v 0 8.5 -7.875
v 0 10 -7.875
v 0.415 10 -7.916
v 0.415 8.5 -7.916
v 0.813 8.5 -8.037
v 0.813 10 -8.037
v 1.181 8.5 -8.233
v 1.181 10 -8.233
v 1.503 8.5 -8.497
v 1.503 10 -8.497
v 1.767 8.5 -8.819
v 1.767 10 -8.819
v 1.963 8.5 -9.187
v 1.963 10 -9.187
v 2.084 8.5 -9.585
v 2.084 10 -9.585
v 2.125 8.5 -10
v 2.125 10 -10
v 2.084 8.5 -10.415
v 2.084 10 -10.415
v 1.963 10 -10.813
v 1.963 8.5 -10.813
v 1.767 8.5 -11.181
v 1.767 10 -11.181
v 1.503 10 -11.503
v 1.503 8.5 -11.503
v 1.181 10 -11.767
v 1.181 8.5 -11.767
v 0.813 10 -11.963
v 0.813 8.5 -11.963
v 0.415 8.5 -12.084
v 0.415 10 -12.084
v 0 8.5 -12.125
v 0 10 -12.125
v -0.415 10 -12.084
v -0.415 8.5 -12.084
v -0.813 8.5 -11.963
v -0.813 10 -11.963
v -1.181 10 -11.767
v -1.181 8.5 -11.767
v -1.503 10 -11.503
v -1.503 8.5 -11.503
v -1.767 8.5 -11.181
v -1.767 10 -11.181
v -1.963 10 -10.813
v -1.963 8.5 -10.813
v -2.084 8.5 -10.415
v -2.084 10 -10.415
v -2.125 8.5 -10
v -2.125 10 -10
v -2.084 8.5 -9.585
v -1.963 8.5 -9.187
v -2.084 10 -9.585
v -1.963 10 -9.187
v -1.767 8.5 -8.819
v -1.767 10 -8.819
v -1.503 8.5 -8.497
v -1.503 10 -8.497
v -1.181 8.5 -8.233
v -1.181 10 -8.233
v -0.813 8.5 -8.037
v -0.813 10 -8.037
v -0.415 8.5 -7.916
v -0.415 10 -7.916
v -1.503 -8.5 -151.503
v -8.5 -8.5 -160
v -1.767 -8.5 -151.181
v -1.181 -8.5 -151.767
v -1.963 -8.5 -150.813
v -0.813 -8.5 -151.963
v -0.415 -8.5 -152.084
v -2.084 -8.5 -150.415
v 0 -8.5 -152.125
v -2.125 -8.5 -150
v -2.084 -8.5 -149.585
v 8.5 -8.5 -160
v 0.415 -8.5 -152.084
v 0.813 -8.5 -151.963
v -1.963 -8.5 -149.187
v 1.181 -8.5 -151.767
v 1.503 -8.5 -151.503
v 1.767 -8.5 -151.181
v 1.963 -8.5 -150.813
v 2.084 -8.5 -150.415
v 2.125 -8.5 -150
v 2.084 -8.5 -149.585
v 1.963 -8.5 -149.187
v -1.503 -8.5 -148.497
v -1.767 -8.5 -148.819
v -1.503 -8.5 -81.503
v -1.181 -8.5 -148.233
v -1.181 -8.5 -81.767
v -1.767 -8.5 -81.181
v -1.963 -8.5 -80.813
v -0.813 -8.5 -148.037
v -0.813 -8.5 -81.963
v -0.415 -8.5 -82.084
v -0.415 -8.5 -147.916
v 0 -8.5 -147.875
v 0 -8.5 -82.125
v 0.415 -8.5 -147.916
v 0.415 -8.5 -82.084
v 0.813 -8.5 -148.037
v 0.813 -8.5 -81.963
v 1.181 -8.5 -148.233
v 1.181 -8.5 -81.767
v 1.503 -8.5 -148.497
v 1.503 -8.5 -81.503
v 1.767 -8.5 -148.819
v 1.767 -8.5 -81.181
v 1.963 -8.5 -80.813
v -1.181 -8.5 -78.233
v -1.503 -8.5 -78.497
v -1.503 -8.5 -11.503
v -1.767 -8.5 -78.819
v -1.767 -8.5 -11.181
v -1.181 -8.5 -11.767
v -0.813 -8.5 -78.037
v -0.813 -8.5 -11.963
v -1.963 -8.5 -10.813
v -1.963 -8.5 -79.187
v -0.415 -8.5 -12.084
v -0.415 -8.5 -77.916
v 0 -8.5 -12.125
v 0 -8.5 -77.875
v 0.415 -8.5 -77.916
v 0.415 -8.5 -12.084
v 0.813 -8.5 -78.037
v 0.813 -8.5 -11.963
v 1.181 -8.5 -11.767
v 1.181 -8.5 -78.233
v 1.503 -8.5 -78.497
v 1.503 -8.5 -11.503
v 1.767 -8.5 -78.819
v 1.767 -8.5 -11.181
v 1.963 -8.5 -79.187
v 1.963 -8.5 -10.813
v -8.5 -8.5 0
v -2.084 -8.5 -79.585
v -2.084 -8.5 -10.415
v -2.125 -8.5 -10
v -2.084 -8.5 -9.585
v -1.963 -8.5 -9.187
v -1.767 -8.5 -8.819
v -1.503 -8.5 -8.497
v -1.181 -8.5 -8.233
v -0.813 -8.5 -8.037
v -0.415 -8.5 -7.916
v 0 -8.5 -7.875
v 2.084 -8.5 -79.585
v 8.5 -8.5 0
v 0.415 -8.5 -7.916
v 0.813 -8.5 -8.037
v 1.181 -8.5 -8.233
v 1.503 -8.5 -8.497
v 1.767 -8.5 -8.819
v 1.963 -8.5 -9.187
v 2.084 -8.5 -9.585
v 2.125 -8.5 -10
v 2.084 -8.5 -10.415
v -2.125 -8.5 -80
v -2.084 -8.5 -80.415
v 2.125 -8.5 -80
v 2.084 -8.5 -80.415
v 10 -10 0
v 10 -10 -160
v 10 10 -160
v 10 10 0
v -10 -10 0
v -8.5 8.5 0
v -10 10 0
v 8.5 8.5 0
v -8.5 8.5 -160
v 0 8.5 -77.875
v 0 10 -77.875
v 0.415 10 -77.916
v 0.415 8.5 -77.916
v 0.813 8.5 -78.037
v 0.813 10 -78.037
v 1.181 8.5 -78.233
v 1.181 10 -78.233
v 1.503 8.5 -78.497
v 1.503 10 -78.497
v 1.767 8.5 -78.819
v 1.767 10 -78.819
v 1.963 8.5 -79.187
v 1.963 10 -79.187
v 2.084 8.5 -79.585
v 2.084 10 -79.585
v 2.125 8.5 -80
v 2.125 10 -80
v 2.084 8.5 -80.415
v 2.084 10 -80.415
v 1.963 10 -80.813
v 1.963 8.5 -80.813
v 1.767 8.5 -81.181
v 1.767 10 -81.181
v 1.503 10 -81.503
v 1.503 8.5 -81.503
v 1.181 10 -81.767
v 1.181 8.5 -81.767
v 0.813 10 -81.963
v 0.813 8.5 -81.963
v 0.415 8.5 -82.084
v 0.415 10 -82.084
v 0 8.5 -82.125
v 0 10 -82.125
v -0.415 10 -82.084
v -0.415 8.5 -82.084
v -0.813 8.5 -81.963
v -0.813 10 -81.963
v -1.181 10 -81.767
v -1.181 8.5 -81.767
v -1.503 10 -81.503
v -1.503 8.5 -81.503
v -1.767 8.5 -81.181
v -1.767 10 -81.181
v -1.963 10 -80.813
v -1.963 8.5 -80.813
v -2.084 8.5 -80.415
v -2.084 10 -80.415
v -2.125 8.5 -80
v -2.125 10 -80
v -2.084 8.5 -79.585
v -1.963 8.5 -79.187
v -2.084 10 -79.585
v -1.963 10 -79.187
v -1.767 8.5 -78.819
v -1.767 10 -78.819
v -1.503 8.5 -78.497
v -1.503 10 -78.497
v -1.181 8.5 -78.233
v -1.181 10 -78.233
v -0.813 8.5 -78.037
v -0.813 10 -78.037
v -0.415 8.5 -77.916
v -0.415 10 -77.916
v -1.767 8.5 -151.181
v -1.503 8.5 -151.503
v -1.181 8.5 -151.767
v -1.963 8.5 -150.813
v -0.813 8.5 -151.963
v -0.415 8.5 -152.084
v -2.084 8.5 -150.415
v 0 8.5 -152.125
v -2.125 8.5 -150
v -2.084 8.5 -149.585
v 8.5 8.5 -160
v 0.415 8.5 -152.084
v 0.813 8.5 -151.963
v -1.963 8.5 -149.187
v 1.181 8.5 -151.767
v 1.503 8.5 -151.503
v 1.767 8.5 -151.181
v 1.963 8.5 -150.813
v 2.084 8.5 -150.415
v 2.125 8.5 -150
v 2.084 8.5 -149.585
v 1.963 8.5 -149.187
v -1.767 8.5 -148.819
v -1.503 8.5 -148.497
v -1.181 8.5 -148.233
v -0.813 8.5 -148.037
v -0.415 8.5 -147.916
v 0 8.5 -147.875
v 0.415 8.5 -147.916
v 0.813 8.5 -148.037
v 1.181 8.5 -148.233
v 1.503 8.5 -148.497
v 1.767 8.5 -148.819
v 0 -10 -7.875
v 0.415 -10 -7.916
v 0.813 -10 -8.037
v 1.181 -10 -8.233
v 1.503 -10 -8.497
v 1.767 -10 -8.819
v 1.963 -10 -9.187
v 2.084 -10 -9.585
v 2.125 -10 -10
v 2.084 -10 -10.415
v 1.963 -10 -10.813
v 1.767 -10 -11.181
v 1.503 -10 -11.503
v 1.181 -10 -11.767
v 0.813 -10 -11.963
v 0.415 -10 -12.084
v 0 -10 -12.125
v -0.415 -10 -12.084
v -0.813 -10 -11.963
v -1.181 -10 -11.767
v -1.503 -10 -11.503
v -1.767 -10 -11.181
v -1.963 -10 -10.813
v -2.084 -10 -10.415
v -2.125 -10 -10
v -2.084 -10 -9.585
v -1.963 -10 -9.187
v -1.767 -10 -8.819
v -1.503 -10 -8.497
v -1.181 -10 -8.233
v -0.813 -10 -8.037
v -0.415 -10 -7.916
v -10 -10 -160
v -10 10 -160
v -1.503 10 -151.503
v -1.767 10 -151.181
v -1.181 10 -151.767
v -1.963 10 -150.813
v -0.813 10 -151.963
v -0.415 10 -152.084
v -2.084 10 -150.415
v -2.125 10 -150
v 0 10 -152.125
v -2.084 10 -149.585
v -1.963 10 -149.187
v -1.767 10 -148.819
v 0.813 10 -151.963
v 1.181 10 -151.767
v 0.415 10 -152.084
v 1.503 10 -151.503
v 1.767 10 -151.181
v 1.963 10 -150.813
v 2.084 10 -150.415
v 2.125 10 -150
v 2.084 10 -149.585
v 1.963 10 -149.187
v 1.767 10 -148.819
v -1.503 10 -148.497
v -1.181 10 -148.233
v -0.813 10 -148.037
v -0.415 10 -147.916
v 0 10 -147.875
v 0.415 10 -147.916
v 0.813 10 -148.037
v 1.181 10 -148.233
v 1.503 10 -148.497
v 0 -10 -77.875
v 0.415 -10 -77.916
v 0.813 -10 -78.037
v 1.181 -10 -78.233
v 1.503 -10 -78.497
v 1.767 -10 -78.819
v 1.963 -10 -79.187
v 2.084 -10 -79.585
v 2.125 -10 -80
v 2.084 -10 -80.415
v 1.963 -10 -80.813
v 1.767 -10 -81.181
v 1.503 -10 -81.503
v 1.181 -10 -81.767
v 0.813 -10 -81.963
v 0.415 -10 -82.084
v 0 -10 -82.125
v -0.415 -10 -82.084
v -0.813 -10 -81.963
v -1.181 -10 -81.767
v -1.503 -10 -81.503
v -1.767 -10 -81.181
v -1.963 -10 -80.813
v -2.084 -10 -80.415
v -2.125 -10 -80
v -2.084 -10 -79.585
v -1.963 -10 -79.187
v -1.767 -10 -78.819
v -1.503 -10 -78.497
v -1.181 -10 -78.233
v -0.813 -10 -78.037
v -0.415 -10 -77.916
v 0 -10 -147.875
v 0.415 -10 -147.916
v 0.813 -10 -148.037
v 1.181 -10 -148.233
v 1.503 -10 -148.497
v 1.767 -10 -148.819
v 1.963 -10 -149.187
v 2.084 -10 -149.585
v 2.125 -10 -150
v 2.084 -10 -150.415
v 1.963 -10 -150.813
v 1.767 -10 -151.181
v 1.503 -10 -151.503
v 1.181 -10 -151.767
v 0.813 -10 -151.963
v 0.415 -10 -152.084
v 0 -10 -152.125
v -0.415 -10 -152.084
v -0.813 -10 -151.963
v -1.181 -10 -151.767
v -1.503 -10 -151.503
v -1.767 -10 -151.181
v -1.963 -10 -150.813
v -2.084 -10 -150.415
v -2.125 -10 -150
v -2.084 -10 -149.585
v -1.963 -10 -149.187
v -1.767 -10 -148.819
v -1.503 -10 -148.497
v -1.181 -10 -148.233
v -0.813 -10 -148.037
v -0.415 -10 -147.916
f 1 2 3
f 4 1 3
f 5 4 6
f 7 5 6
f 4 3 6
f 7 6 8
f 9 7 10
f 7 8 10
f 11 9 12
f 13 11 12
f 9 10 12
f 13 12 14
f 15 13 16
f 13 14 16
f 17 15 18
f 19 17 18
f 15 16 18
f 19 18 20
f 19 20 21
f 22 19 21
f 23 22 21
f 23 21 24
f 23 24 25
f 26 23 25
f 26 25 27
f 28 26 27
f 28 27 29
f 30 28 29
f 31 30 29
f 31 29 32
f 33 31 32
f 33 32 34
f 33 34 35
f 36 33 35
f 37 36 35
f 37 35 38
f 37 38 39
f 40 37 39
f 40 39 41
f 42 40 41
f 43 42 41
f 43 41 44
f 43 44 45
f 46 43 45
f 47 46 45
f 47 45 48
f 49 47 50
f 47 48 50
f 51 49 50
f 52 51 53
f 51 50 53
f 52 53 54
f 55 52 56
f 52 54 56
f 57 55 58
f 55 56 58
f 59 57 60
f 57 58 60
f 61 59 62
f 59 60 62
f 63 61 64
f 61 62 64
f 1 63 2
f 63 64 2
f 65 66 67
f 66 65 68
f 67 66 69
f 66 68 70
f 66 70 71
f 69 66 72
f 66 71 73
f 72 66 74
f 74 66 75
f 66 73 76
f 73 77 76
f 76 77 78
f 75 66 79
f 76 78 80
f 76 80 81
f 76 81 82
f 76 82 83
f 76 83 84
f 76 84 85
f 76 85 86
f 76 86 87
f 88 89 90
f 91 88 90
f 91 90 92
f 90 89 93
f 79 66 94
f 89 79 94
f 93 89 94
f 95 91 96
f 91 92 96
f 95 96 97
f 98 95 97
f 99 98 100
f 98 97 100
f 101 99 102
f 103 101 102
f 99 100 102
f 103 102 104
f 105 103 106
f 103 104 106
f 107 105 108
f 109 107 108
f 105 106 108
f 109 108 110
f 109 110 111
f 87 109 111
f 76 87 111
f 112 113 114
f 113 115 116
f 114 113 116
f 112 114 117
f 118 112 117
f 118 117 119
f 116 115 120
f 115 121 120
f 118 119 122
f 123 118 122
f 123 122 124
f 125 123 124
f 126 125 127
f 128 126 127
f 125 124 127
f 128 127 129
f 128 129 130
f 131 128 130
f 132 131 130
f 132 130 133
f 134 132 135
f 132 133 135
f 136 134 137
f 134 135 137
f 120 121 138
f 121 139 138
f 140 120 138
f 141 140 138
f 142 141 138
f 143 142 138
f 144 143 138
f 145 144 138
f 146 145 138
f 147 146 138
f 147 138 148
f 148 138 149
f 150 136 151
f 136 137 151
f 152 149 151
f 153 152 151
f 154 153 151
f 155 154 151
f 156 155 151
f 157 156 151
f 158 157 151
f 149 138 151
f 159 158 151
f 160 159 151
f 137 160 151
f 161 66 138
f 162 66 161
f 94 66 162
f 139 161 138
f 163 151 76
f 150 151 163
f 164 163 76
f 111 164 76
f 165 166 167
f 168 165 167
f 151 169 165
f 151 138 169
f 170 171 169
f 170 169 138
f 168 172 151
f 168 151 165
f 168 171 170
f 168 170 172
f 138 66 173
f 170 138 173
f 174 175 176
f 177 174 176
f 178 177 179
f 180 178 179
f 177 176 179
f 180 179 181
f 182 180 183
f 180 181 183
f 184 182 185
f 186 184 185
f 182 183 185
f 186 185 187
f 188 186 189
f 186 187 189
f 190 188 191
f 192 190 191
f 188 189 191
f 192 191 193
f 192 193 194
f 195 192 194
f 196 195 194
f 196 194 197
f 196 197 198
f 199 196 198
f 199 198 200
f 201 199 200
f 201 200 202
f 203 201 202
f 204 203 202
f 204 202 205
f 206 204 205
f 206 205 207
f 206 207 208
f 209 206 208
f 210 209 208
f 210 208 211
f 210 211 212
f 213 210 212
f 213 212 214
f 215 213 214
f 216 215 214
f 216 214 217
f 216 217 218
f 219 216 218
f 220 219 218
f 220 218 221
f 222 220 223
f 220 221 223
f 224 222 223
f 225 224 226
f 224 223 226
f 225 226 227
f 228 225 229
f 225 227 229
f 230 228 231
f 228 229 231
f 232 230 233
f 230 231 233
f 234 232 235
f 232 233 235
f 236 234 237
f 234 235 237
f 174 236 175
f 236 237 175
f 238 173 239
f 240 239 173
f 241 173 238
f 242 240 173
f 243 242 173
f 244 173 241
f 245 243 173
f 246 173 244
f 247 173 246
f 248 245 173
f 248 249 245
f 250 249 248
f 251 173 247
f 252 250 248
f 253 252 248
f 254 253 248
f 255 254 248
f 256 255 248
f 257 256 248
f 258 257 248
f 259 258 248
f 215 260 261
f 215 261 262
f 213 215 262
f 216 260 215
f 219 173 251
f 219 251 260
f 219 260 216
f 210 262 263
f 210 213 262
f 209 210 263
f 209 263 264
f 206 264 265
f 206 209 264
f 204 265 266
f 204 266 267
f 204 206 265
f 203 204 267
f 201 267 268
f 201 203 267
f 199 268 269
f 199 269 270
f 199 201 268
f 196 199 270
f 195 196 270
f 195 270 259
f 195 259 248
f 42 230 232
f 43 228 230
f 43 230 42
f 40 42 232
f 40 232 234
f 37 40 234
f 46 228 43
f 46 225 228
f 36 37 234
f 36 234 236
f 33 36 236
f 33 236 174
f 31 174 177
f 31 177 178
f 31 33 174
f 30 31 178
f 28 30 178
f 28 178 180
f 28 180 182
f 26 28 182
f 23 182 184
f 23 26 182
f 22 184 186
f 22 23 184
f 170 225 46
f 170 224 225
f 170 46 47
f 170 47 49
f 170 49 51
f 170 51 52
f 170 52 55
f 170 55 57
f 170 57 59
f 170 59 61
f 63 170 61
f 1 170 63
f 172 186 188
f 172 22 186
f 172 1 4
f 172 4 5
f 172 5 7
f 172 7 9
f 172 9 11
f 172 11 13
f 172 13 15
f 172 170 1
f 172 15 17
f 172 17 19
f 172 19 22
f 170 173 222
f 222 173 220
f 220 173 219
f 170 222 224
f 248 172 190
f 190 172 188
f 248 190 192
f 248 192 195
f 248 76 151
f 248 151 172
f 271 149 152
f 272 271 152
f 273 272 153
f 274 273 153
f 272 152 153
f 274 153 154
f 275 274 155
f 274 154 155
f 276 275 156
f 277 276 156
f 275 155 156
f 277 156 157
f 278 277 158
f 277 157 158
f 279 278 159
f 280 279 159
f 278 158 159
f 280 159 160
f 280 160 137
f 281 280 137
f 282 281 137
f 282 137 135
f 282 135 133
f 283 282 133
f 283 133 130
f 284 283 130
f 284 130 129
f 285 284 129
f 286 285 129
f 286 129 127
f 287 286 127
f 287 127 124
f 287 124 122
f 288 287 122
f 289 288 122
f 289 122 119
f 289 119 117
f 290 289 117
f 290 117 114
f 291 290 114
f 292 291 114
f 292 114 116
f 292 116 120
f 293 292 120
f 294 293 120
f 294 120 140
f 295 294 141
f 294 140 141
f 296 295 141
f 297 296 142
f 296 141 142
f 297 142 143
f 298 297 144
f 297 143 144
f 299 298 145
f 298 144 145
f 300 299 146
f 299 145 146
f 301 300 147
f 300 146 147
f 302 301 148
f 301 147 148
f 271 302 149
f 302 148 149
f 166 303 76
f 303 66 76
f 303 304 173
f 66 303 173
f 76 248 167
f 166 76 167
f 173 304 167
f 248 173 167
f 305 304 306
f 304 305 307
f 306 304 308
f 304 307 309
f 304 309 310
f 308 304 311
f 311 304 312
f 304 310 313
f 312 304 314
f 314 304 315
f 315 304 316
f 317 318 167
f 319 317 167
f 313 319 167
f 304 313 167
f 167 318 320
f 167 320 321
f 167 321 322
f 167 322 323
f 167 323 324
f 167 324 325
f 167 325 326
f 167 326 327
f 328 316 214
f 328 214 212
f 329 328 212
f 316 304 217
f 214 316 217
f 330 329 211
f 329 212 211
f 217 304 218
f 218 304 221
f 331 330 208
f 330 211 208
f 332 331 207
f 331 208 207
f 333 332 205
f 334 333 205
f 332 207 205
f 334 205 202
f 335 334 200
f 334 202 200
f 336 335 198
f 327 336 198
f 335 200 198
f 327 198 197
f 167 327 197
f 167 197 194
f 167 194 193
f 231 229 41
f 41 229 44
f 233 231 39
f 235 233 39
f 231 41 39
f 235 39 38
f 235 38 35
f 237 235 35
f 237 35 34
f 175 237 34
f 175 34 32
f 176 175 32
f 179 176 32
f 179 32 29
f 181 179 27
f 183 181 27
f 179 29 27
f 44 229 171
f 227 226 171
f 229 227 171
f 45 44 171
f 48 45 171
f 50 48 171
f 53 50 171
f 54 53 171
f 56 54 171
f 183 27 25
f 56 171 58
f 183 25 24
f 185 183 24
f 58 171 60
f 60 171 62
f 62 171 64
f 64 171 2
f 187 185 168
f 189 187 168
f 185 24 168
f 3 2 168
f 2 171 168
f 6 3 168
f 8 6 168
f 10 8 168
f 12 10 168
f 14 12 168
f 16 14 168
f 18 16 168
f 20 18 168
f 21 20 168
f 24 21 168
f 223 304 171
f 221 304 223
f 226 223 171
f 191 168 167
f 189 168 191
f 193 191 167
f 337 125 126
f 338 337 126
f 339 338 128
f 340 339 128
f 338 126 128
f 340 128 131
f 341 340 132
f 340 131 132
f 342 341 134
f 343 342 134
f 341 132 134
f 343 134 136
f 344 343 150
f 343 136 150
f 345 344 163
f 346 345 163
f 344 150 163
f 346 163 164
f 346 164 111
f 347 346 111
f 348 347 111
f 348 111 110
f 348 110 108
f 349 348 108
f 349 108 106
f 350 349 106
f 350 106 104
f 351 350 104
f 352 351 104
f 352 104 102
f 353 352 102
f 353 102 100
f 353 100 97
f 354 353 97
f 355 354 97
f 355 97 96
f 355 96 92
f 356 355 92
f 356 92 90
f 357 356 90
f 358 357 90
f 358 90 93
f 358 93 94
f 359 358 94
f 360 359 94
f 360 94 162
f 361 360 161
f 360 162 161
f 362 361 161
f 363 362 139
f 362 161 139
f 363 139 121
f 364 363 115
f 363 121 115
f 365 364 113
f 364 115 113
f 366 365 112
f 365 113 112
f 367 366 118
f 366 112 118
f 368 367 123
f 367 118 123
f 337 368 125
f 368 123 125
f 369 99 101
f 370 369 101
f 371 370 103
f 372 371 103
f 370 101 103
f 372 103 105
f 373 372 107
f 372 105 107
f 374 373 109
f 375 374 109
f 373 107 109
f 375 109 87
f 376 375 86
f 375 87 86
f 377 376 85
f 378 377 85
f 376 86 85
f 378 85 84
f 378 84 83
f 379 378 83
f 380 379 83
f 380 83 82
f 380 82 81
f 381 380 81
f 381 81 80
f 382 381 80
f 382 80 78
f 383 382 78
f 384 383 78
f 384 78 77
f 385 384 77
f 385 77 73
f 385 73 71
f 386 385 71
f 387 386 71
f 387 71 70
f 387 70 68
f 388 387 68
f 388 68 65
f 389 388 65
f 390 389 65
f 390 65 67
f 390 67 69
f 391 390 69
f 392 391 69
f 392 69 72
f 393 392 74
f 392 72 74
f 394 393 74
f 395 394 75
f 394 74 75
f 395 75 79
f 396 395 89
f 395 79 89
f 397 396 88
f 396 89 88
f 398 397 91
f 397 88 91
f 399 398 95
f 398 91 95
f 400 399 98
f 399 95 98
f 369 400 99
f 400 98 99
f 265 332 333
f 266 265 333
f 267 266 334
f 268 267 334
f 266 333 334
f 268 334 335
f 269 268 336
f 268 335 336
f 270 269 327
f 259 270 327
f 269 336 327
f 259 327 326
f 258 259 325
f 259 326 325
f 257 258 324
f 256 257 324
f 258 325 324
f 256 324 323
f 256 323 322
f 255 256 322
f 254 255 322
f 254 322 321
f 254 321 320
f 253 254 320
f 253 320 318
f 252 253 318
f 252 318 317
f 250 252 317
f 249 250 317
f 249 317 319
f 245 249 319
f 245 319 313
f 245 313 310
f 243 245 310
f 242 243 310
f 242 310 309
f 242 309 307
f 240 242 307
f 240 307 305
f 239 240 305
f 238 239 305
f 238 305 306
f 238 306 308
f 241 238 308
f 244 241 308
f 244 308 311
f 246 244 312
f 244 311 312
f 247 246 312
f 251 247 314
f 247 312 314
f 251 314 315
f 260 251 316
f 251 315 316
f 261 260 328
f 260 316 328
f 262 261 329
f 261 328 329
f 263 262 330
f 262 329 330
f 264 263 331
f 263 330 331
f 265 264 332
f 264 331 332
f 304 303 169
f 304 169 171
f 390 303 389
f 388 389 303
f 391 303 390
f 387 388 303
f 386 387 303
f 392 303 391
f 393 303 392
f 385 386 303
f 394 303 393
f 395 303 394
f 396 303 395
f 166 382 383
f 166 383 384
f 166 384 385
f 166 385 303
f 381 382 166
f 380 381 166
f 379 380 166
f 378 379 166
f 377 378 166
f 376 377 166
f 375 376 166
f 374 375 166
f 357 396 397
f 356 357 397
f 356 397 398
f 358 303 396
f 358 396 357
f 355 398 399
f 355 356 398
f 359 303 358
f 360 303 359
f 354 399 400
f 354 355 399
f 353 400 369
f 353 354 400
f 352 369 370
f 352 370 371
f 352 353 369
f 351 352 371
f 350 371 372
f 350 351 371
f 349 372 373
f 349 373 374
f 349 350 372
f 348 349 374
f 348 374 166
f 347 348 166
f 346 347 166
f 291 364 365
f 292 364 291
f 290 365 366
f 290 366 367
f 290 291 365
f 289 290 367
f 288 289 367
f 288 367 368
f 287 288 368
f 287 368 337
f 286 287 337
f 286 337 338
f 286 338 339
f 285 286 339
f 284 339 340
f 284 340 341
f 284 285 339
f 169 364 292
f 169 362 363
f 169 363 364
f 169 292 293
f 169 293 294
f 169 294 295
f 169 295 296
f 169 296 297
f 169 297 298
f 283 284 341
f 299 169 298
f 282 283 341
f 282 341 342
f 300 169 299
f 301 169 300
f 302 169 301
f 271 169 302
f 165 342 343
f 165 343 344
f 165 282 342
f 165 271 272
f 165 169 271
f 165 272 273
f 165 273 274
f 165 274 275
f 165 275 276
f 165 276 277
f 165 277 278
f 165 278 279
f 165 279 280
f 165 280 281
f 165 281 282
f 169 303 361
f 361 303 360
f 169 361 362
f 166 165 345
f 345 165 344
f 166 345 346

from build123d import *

# Parameters (mm, degrees)
SKETCH1_W           = 20
SKETCH1_H           = 20
SKETCH1_W_2         = 17
SKETCH1_H_2         = 17
BOSS_EXTRUDE1_DEPTH = 160
SKETCH2_R           = 2.125
CUT_EXTRUDE1_DEPTH  = 162.554944214


with BuildPart() as part:
    # Sketch1 → Boss-Extrude1 (new body)
    with BuildSketch(Plane.XY):
        Rectangle(SKETCH1_W, SKETCH1_H)
        Rectangle(SKETCH1_W_2, SKETCH1_H_2, mode=Mode.SUBTRACT)
    extrude(amount=-BOSS_EXTRUDE1_DEPTH)

    # Sketch2 → Cut-Extrude1 (cut, through all)
    with BuildSketch(Plane(origin=(0, 10, 0), x_dir=(1, 0, 0), z_dir=(0, 1, 0))):
        with Locations(Location((0, 10, 0), (0, 0, 270))):
            Circle(SKETCH2_R)
        with Locations(Location((0, 80, 0), (0, 0, 270))):
            Circle(SKETCH2_R)
        with Locations(Location((0, 150, 0), (0, 0, 270))):
            Circle(SKETCH2_R)
    extrude(amount=-CUT_EXTRUDE1_DEPTH, mode=Mode.SUBTRACT)


solid = part.part
